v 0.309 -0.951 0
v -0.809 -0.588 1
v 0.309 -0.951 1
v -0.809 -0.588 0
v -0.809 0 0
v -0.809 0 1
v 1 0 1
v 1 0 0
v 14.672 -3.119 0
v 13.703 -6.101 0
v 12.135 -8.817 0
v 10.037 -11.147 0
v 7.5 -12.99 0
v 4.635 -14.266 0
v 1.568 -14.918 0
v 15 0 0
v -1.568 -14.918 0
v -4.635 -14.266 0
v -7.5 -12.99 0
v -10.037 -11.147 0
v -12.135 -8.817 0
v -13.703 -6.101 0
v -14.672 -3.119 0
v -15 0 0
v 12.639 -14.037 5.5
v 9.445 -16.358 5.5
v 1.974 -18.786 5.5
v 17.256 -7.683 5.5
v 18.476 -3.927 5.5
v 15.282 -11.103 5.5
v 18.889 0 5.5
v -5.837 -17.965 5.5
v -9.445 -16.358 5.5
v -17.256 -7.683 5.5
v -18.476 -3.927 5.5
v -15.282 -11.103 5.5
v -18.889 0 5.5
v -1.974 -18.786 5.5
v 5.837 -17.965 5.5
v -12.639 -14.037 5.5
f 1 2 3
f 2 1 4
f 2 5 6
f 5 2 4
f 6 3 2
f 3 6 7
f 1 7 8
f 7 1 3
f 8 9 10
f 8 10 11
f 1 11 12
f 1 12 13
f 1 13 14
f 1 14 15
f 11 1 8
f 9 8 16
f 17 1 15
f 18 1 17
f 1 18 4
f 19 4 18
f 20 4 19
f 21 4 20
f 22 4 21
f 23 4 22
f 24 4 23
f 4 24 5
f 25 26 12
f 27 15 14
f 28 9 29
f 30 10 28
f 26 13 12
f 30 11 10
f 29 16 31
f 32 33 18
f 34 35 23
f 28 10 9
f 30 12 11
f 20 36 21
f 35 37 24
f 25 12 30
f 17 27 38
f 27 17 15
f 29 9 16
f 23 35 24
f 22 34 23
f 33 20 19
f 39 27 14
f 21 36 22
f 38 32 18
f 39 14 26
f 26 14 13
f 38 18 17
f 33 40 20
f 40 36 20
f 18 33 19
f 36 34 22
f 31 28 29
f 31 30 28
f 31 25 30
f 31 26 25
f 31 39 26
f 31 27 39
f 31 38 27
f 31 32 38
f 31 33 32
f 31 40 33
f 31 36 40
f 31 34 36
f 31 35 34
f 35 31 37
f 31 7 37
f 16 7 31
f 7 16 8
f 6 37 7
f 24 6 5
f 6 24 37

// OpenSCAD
clearance = 0.254;

extruder_diameter = 0.8;

bracket_thickness = 10;
gate_head_slot_thickness = 2;
gate_head_thickness = 3.5;
gate_head_diameter = 20.2;
gate_socket_outer_slope_degrees = 45;
gate_socket_outer_diameter_gate_side = 30;

module gate_socket() {
gate_socket_outer_height = gate_head_slot_thickness + gate_head_thickness;
gate_socket_outer_diameter_mounting_side = gate_socket_outer_diameter_gate_side + (2 * gate_socket_outer_height * cos(gate_socket_outer_slope_degrees));
    
    module outer_shell() {
        boss_outer_diameter_gate_side = 30;
        cylinder(
            h=gate_socket_outer_height, 
            r1=gate_socket_outer_diameter_gate_side / 2, 
            r2=gate_socket_outer_diameter_mounting_side / 2
        );
    }
    
    module top_cut() {
        translate([-gate_socket_outer_diameter_mounting_side / 2, 0 ,0])
        cube(gate_socket_outer_diameter_mounting_side);
    }
    
    module inner_cut() {
        module gate_head_slot_cut() {
            // the smallest cylindrical cut near outermost surface
        };
        cylinder(h=1, r=1);
        cylinder(h=1, r=1);
    }
    
    difference() {
        outer_shell();
        top_cut();
        inner_cut();
    };
}

gate_socket();
